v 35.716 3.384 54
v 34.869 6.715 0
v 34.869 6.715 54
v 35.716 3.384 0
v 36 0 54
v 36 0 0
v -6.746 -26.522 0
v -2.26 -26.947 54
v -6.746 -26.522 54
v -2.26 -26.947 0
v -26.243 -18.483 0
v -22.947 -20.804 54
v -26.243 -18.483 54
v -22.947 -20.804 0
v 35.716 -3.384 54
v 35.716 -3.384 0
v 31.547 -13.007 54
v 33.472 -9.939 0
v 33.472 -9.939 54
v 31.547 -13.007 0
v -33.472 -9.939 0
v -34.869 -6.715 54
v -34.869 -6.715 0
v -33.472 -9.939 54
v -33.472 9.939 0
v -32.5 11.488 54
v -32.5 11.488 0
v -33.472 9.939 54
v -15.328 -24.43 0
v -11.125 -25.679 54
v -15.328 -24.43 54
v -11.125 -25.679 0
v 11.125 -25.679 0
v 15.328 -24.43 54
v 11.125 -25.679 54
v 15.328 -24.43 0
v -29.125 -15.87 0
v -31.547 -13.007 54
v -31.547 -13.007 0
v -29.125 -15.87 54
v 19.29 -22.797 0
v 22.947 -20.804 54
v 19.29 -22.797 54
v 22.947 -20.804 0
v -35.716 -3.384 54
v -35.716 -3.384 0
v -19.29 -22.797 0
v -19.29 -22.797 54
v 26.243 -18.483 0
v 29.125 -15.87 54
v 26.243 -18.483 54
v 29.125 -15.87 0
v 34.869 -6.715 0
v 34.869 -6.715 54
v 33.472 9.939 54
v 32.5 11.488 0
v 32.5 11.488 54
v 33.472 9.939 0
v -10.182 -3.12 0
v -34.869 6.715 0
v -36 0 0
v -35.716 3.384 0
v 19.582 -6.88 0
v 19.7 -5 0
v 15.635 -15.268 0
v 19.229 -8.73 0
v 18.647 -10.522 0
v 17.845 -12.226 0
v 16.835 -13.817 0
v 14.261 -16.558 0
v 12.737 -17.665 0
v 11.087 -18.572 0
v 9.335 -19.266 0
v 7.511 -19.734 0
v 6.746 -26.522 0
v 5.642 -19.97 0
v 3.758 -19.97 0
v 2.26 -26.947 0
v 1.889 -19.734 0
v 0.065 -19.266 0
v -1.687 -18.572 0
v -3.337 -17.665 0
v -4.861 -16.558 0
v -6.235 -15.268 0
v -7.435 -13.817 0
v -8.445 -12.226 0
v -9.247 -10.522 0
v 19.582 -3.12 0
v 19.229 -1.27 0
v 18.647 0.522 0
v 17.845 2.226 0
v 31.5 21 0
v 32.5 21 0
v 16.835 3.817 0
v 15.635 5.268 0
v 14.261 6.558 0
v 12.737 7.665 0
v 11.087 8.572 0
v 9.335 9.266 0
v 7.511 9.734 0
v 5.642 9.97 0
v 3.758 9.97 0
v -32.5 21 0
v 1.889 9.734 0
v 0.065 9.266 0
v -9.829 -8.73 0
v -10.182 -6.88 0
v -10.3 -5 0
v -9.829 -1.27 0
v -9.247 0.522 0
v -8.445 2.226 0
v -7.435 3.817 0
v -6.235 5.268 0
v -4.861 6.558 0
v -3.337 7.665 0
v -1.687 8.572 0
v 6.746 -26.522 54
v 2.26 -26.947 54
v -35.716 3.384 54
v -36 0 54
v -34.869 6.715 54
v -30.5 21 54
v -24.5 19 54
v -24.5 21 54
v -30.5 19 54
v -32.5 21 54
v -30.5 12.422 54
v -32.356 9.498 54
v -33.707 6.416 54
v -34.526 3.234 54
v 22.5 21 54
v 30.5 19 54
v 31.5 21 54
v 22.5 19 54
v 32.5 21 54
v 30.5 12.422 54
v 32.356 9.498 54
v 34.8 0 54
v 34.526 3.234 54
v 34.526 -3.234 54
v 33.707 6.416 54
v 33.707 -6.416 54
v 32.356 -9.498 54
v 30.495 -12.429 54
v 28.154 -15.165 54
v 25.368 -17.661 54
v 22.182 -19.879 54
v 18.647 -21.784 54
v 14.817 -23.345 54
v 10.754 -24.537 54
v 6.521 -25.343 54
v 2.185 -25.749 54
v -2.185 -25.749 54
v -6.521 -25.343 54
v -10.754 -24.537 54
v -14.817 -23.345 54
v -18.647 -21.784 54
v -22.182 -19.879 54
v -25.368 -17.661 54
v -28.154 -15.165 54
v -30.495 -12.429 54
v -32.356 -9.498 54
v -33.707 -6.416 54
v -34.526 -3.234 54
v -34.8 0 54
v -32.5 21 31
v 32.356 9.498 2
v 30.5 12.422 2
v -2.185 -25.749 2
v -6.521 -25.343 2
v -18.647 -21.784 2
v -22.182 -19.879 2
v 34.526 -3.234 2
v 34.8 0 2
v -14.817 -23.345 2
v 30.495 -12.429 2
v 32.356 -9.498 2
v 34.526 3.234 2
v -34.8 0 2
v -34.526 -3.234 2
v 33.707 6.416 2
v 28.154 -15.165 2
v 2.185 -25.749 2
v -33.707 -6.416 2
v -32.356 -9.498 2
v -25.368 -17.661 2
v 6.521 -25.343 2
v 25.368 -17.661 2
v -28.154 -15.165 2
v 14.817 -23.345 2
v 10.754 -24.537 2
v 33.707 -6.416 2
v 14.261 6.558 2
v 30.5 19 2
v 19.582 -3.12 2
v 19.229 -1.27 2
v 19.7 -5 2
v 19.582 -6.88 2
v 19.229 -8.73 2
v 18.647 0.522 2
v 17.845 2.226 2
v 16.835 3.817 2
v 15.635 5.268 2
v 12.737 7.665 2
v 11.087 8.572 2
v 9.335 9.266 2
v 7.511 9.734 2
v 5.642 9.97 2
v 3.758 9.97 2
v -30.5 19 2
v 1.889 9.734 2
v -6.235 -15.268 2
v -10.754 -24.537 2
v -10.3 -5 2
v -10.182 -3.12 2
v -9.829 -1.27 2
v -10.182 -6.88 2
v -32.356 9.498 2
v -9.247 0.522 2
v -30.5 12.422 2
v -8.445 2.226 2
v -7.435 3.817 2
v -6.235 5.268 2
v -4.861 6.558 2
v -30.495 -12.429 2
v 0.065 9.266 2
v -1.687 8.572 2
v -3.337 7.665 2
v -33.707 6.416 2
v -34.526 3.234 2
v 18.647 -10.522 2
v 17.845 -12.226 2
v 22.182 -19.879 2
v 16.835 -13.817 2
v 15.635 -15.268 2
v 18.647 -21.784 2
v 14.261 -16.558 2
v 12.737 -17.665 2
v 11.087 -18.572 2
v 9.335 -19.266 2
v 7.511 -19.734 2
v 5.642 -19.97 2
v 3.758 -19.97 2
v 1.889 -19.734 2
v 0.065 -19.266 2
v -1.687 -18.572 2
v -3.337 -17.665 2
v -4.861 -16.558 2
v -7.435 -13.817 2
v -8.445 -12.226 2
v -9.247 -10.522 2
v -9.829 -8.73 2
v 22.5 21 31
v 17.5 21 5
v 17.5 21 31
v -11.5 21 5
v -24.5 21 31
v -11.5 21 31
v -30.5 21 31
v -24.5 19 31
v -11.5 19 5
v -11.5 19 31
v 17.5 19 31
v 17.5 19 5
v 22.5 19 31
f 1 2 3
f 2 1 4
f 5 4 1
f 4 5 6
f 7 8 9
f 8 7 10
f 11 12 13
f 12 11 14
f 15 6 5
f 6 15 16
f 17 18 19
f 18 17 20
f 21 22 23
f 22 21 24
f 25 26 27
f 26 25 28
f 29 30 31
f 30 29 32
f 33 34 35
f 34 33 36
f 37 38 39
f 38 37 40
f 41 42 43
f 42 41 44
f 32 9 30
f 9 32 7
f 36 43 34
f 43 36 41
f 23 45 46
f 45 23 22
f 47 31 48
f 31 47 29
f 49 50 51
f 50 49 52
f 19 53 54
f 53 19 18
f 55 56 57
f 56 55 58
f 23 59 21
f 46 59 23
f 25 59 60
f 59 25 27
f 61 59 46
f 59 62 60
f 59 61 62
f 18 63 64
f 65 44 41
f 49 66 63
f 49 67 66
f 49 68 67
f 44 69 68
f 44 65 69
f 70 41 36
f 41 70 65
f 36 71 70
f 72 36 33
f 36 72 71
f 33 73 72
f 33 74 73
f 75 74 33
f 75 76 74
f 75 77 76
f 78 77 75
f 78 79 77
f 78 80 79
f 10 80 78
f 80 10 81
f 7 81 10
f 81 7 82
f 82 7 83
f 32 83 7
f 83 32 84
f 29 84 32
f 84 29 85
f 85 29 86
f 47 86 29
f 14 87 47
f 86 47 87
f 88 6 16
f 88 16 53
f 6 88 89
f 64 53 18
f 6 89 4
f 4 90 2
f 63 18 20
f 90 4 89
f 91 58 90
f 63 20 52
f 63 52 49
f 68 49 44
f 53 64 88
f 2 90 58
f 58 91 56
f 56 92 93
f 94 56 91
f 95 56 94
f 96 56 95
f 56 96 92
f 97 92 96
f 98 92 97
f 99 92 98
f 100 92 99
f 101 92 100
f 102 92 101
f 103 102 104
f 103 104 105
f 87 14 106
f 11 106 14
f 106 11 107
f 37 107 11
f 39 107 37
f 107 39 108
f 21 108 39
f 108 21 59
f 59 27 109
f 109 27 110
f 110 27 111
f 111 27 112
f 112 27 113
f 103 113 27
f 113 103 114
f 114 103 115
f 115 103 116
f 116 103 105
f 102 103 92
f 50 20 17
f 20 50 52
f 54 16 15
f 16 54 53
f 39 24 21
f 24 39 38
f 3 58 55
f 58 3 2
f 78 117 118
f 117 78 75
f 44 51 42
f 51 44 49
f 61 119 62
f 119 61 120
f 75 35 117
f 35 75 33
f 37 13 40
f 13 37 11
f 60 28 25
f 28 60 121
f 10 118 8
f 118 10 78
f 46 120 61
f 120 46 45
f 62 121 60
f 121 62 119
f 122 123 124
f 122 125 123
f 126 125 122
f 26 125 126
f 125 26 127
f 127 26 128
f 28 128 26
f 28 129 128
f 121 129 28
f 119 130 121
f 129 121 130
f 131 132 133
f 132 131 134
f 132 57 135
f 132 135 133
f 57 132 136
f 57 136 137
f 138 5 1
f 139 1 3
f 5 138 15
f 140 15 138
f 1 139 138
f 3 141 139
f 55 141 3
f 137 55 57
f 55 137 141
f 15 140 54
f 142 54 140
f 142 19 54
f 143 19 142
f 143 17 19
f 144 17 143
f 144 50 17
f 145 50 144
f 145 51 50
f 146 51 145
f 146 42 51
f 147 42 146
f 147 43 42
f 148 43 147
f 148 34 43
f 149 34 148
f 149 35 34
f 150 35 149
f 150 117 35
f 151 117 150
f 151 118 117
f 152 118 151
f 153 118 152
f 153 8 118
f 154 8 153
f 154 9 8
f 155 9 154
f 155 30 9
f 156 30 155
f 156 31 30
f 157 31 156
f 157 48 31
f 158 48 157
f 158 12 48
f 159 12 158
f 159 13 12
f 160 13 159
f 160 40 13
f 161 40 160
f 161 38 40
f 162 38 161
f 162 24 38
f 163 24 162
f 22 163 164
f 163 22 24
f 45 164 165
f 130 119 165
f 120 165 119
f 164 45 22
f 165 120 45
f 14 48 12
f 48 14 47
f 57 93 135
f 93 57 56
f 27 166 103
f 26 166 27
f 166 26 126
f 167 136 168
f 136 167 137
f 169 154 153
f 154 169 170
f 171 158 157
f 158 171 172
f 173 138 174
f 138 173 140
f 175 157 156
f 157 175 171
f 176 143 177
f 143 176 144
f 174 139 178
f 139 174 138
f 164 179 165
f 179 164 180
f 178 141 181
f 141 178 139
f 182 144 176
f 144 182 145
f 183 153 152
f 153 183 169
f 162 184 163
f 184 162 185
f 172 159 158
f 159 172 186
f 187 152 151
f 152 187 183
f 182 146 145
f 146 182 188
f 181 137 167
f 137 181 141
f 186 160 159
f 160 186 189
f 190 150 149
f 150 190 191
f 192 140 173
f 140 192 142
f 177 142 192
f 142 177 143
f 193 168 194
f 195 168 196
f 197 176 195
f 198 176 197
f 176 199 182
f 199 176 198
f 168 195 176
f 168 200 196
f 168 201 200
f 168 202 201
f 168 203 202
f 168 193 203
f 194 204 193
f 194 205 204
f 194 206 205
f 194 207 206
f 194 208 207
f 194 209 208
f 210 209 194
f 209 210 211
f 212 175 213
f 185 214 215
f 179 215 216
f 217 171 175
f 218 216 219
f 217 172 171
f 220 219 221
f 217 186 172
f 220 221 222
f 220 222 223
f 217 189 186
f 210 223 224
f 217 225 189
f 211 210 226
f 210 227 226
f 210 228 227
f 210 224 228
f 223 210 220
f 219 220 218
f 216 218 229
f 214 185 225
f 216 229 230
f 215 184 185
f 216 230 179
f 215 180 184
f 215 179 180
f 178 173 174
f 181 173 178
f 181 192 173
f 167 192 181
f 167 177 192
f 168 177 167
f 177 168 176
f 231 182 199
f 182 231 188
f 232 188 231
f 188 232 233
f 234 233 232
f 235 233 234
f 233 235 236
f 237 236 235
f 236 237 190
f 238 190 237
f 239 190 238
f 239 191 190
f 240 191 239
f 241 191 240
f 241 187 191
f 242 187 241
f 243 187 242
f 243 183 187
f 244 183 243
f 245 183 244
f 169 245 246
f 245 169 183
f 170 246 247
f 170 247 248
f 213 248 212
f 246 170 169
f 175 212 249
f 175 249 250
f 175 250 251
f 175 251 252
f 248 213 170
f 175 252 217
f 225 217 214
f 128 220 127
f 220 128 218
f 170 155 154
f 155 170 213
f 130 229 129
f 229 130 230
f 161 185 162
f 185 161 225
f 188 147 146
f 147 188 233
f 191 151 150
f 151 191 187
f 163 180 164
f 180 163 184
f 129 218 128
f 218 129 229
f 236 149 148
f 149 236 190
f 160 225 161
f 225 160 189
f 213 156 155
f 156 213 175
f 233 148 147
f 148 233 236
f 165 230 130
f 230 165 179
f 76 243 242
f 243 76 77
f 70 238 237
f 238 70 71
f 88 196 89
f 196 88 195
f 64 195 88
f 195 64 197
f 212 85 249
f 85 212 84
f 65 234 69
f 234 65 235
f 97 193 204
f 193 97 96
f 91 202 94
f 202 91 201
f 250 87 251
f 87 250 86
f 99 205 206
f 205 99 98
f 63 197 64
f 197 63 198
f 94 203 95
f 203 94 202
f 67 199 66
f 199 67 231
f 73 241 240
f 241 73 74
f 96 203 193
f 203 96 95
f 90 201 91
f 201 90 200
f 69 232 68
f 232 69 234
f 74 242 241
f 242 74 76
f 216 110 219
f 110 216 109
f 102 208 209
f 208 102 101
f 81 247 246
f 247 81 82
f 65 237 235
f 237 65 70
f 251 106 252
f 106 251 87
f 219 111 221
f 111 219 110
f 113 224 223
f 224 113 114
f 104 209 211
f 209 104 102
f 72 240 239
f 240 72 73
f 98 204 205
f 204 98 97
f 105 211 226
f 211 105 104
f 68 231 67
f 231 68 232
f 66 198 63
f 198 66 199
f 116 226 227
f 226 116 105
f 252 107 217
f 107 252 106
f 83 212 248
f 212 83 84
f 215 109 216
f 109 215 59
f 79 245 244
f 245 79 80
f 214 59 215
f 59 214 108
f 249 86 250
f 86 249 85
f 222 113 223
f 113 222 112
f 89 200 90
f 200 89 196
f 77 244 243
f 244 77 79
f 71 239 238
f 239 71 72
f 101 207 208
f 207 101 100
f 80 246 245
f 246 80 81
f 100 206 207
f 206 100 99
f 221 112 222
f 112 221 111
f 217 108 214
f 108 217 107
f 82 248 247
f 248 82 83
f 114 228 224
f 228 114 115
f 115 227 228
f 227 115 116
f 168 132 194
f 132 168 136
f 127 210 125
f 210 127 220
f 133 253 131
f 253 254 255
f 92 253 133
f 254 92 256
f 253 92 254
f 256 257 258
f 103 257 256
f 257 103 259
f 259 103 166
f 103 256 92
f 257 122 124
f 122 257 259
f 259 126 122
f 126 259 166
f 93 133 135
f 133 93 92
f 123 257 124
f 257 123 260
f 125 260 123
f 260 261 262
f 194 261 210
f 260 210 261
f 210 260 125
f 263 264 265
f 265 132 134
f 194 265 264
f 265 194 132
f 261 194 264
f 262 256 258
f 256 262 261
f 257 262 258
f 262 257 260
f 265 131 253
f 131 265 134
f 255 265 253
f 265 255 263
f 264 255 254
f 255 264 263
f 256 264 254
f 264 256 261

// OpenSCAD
$fn = 50;
scl = 1.0;
ovalr0 = 34;
ovalr1 = 25;

module oval(w,h, height, center = true) { 
    scale([1, h/w, 1]) cylinder(h=height, r=w, center=center); 
} 

module build_envelope(){
	 gasket_thickness = 0;
    h = 54 + gasket_thickness;
    sqw = 65;
    sqd = 9;
    sqy = 12;
    ishell = 0.8;
    oshell = 2;
    //color([0,0,1,0.5])
    scale([scl,scl,scl])
    difference(){
    union(){
        difference(){
            union(){
                
                translate([0,0,h/2]) oval(ovalr0 + oshell, ovalr1 + oshell, h);
                translate([-sqw/2,sqd,0]) cube([sqw,20,h]);
            }
            translate([0,0,h/2+oshell]) oval(ovalr0 + ishell, ovalr1 + ishell, h);
            translate([4.7,-5,0]) cylinder(r=15,h=3);
            translate([-sqw/2+oshell,sqy,oshell]) cube([sqw-2*oshell,sqd,h]);
            translate([-sqw/2,sqy+sqd,0]) cube([sqw,100,h]);
        }
        translate([-sqw/2+oshell,sqy+sqd-oshell,0]) cube([6,oshell,h]);
        translate([-sqw/2,sqy+sqd-oshell,0]) cube([21,oshell,h/2+4]);
        translate([sqw/2-10,sqy+sqd-oshell,0]) cube([9,oshell,h]);
        translate([sqw/2-15,sqy+sqd-oshell,0]) cube([14,oshell,h/2+4]);
        translate([-sqw/2,sqy+sqd-oshell,0]) cube([60,oshell,5]);
    }
        //translate([-sqw/2+5,sqy+sqd-oshell,4]) cube([10,oshell,15]);
    }
}

build_envelope();
